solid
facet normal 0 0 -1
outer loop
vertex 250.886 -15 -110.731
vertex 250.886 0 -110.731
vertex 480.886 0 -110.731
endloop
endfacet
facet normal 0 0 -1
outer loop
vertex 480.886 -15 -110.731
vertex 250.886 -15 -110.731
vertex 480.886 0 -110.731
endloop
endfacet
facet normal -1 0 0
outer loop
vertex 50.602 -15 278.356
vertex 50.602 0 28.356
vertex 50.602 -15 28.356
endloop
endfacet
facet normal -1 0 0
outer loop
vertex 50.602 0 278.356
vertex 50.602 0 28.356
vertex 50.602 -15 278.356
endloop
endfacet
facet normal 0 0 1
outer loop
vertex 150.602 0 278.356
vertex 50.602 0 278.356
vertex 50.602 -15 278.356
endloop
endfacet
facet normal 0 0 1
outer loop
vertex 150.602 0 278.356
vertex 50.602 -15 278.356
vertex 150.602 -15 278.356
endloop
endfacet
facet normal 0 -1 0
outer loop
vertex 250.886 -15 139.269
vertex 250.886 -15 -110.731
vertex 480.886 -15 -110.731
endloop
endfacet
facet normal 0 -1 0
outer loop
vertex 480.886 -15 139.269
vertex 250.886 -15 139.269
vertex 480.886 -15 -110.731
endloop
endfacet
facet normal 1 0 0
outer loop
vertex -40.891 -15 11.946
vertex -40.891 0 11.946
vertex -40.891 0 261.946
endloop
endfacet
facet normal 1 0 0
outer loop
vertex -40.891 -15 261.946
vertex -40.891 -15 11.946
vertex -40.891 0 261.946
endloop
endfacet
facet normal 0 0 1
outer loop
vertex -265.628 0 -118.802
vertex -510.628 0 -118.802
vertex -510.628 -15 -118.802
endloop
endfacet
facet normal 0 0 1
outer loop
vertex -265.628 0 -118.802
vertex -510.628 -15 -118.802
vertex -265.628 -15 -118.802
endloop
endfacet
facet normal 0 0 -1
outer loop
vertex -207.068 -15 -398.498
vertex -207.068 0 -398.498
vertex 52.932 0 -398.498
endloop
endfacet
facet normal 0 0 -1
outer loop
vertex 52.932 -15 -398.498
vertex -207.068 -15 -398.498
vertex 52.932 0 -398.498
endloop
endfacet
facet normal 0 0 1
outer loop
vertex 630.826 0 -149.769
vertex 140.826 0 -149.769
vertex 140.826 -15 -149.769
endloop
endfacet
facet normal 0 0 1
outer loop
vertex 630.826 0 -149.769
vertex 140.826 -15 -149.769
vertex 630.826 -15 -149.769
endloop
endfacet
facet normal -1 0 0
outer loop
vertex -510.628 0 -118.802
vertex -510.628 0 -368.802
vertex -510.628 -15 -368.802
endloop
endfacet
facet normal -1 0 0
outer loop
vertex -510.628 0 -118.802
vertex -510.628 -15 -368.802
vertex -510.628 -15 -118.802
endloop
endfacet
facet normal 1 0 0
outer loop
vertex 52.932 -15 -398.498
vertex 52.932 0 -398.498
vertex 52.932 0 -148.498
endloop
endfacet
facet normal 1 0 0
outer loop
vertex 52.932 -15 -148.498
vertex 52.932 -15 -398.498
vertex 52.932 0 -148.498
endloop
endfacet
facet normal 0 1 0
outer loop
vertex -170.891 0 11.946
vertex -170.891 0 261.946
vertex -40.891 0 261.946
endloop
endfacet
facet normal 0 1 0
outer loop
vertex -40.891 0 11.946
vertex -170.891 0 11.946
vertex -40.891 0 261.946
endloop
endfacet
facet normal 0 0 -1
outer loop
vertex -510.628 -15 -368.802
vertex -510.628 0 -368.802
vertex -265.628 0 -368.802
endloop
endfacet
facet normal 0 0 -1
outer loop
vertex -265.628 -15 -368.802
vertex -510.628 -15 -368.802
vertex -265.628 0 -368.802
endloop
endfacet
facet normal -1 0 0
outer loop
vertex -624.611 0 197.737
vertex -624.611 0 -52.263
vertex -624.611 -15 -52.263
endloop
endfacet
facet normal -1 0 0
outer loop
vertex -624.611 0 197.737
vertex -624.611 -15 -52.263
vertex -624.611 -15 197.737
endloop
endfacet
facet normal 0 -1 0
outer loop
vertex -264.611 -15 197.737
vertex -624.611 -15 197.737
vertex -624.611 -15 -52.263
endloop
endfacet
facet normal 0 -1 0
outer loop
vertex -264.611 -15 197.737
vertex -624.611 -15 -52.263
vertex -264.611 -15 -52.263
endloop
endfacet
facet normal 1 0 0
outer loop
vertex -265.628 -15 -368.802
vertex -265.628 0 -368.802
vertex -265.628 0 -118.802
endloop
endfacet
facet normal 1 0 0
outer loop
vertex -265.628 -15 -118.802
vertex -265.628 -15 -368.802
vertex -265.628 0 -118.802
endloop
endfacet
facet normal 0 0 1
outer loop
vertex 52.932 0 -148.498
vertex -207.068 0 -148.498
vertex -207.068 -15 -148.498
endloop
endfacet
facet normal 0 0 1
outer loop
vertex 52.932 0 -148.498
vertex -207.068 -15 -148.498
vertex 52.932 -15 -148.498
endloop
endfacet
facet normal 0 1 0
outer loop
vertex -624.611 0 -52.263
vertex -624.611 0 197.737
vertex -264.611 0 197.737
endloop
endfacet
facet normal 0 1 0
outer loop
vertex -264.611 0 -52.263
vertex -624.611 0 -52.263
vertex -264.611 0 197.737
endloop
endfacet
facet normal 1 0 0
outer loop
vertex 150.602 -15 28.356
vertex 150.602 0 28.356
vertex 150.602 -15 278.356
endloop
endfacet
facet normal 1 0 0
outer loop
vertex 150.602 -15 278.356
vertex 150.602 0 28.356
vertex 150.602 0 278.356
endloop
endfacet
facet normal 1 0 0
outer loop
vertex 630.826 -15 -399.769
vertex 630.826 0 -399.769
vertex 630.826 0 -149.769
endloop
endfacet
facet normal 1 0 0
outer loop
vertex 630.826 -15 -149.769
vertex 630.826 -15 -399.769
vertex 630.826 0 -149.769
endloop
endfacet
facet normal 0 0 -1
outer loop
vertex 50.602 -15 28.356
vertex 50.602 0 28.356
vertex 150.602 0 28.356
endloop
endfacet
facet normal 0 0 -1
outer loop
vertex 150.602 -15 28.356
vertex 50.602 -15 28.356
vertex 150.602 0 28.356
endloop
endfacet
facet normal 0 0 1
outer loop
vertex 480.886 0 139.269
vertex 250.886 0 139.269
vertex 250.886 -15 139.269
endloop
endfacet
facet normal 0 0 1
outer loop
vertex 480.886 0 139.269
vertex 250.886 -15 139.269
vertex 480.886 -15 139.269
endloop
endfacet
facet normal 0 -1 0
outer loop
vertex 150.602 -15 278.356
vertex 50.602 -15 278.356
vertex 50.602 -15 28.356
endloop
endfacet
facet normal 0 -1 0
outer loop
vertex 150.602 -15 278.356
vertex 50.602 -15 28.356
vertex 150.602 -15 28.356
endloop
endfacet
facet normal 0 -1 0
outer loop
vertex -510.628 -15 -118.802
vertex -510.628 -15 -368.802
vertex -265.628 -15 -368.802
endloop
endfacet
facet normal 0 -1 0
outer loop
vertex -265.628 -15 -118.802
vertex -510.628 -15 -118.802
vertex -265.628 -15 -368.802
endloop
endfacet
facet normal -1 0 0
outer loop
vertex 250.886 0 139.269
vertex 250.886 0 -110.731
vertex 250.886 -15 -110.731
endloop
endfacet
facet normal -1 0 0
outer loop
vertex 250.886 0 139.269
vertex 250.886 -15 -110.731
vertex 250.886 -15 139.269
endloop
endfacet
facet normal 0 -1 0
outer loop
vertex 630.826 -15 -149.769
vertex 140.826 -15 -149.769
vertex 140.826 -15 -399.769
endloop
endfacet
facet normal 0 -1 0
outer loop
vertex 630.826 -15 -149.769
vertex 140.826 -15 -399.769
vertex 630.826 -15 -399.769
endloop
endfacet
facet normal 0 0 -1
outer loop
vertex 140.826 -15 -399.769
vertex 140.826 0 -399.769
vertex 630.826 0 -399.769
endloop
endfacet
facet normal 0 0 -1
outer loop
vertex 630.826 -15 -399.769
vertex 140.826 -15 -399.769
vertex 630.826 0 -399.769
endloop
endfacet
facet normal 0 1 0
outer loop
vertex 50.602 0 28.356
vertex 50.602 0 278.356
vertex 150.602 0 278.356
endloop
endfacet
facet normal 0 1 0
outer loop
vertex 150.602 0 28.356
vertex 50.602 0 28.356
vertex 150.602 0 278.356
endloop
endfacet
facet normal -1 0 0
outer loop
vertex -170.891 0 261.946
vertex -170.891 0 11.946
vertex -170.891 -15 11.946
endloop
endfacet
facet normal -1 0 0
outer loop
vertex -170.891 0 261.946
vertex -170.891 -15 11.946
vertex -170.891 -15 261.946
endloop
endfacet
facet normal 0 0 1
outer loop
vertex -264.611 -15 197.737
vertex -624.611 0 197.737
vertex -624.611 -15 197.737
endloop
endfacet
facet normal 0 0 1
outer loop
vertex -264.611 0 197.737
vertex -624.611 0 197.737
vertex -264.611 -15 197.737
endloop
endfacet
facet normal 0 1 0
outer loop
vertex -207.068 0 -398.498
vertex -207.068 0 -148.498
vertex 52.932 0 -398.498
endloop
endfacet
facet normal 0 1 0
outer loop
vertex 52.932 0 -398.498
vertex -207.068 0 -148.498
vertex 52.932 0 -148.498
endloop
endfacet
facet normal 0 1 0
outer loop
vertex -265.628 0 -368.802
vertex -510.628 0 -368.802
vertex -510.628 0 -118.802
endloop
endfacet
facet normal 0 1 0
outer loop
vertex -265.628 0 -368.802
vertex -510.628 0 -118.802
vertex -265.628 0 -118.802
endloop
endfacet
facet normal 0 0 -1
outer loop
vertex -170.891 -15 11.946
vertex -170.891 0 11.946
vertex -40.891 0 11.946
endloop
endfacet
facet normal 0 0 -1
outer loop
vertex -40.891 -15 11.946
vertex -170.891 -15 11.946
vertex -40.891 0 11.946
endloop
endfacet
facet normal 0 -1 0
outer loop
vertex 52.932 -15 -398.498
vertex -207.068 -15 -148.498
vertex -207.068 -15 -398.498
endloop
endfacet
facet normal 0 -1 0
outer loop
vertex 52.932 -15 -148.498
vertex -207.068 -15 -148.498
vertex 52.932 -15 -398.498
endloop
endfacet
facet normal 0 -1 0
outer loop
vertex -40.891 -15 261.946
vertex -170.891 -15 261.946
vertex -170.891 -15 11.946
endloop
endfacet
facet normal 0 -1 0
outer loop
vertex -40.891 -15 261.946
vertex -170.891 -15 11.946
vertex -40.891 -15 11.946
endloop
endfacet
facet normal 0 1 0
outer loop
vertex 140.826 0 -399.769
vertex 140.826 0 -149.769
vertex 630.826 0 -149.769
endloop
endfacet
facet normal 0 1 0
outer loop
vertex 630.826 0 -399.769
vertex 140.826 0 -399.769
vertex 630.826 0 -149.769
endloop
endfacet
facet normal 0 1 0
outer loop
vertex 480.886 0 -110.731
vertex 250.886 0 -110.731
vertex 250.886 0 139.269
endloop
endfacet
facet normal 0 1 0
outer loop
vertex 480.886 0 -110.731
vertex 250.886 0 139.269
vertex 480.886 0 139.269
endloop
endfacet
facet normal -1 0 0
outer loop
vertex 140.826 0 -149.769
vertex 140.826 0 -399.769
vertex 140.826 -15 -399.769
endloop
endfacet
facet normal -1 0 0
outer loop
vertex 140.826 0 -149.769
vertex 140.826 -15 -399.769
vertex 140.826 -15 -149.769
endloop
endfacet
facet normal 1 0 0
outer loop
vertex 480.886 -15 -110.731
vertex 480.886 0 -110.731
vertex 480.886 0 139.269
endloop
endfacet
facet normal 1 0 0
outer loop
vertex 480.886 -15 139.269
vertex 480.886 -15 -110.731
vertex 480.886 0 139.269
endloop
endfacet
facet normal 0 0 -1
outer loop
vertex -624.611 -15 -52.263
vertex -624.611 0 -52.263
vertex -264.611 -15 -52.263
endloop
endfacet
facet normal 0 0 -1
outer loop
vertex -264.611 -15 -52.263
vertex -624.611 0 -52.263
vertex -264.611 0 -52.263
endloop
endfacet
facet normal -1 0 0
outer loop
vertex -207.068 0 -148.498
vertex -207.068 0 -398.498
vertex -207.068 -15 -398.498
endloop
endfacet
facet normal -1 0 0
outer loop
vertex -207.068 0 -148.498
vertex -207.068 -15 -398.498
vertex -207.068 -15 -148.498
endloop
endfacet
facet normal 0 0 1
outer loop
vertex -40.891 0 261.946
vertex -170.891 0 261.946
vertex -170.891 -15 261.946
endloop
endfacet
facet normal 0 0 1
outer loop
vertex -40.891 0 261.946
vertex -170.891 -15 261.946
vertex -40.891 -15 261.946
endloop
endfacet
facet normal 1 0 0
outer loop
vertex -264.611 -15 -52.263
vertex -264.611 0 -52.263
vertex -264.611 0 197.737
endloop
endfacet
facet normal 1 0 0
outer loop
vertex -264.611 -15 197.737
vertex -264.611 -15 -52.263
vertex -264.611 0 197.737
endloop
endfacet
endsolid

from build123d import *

# Parameters (mm, degrees)
F0_W     = 360
F0_H     = 250
F1_DEPTH = 15
F0_W_2   = 130
F2_DEPTH = 15
F0_W_3   = 100
F3_DEPTH = 15
F0_W_4   = 230
F4_DEPTH = 15
F0_W_5   = 245
F5_DEPTH = 15
F0_W_6   = 260
F6_DEPTH = 15
F0_W_7   = 490
F7_DEPTH = 15


with BuildPart() as f1:
    # F0 (on Front) → F1 (new body)
    with BuildSketch(Plane.XZ):
        with Locations((-444.610708, 72.73683)):
            Rectangle(F0_W, F0_H)
    extrude(amount=F1_DEPTH)


with BuildPart() as f2:
    # F0 (on Front) → F2 (new body)
    with BuildSketch(Plane.XZ):
        with Locations((-105.891193, 136.945741)):
            Rectangle(F0_W_2, F0_H)
    extrude(amount=F2_DEPTH)


with BuildPart() as f3:
    # F0 (on Front) → F3 (new body)
    with BuildSketch(Plane.XZ):
        with Locations((100.601799, 153.355513)):
            Rectangle(F0_W_3, F0_H)
    extrude(amount=F3_DEPTH)


with BuildPart() as f4:
    # F0 (on Front) → F4 (new body)
    with BuildSketch(Plane.XZ):
        with Locations((365.886261, 14.269084)):
            Rectangle(F0_W_4, F0_H)
    extrude(amount=F4_DEPTH)


with BuildPart() as f5:
    # F0 (on Front) → F5 (new body)
    with BuildSketch(Plane.XZ):
        with Locations((-388.127985, -243.801951)):
            Rectangle(F0_W_5, F0_H)
    extrude(amount=F5_DEPTH)


with BuildPart() as f6:
    # F0 (on Front) → F6 (new body)
    with BuildSketch(Plane.XZ):
        with Locations((-77.068175, -273.498029)):
            Rectangle(F0_W_6, F0_H)
    extrude(amount=F6_DEPTH)


with BuildPart() as f7:
    # F0 (on Front) → F7 (new body)
    with BuildSketch(Plane.XZ):
        with Locations((385.82633, -274.769127)):
            Rectangle(F0_W_7, F0_H)
    extrude(amount=F7_DEPTH)


solid = Compound([f1.part, f2.part, f3.part, f4.part, f5.part, f6.part, f7.part])
